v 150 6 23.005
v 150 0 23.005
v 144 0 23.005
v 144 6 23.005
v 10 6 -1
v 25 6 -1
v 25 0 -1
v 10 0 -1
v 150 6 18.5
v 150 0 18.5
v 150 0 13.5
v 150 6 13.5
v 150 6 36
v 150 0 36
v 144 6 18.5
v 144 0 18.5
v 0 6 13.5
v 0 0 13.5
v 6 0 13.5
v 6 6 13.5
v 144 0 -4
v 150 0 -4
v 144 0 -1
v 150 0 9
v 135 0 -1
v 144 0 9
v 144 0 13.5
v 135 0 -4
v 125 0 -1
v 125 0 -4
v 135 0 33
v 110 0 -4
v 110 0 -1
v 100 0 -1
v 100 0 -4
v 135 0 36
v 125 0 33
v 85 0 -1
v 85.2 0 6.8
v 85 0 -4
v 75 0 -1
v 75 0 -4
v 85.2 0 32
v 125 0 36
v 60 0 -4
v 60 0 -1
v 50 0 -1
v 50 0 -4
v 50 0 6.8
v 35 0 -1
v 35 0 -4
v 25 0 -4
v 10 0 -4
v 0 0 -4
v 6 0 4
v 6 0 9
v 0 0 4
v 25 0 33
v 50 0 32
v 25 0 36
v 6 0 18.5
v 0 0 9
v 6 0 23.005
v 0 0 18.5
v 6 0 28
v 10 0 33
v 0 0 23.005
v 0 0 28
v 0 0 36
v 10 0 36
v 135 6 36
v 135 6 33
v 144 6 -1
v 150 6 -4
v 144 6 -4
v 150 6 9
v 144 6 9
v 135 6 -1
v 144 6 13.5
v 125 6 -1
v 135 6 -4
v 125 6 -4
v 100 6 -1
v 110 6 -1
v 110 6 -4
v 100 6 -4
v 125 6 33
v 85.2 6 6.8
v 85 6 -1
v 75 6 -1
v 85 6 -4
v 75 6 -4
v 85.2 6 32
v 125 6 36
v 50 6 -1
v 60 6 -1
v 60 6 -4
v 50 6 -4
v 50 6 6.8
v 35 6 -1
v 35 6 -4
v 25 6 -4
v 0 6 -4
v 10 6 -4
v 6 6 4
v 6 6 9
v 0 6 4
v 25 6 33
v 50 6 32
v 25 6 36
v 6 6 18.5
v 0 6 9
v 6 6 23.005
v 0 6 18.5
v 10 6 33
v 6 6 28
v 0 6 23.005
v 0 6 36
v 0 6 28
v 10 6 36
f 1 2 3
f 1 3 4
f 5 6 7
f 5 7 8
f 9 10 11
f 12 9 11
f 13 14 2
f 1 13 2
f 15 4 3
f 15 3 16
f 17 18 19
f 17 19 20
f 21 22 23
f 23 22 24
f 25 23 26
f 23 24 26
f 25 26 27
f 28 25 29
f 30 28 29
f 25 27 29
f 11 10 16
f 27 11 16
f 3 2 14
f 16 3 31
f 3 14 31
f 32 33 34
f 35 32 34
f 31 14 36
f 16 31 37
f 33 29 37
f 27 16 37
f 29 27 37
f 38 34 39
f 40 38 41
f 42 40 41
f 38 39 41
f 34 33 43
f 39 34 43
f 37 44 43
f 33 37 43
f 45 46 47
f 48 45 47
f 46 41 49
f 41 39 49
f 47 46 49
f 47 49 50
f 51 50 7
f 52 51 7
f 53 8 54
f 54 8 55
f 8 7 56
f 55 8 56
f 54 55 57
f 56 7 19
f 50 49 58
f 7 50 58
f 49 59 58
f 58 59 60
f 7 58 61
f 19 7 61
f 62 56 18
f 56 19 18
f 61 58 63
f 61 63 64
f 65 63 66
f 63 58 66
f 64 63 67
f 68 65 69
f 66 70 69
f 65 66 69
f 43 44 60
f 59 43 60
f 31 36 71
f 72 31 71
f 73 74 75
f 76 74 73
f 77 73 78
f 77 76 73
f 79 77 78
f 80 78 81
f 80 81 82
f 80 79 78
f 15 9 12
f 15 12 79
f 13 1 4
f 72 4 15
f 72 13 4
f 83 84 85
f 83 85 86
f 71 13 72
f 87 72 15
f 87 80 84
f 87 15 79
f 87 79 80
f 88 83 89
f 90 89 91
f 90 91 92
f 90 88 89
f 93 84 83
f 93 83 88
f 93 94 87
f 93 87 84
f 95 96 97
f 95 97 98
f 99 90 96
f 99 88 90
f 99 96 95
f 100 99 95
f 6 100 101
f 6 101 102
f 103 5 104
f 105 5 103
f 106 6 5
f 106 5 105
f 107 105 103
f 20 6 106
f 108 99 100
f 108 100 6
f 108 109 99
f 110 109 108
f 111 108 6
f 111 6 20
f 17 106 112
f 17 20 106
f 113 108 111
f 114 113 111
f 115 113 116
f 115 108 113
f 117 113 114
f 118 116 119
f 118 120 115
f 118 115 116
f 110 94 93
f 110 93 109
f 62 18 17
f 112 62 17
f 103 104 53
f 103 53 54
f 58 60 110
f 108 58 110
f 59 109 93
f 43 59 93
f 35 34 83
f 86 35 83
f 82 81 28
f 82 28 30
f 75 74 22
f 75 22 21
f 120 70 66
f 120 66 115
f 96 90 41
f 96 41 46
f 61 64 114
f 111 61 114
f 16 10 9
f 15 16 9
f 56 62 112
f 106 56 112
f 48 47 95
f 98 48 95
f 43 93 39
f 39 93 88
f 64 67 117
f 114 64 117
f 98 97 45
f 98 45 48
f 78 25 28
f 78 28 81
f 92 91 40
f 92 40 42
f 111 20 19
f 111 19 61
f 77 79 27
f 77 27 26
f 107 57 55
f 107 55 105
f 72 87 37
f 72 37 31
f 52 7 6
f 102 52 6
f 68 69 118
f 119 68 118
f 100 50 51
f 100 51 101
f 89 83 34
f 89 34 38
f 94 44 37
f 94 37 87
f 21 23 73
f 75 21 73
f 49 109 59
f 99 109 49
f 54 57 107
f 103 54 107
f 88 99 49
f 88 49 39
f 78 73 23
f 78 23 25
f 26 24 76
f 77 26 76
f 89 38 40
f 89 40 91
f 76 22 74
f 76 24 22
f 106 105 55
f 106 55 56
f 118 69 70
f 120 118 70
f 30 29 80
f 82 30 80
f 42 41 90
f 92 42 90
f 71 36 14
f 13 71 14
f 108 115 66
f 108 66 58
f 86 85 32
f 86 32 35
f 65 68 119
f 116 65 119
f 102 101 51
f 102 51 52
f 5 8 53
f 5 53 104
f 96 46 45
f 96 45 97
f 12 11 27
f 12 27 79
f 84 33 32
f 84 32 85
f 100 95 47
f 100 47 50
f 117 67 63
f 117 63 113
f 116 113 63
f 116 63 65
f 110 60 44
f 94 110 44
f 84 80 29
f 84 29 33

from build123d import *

# Parameters (mm, degrees)
SKETCH_1_W             = 150
SKETCH_1_H             = 36
EXTRUDE_2_DEPTH        = 6
SKETCH_6_W             = 10
SKETCH_6_H             = 6
EXTRUDE_4_DEPTH        = 4
PATTERN_LINEAR_1_COUNT = 6
PATTERN_LINEAR_1_PITCH = 25
SKETCH_8_W             = 5
SKETCH_8_H             = 6
SKETCH_8_W_2           = 4.995224333
CUT_EXTRUDE_3_DEPTH    = 6
SKETCH_11_W            = 4.504775667
SKETCH_11_H            = 6
SKETCH_11_W_2          = 4.5
CUT_EXTRUDE_4_DEPTH    = 6
SKETCH_12_W            = 35.2
SKETCH_12_H            = 25.2
CUT_EXTRUDE_5_DEPTH    = 155.376163963
SKETCH_14_W            = 15
SKETCH_14_H            = 6
SKETCH_14_W_2          = 10
CUT_EXTRUDE_6_DEPTH    = 4
SKETCH_15_W            = 15
SKETCH_15_H            = 6
EXTRUDE_5_DEPTH        = 1
PATTERN_LINEAR_2_COUNT = 5
PATTERN_LINEAR_2_PITCH = 25
SKETCH_16_W            = 15
SKETCH_16_H            = 6
EXTRUDE_6_DEPTH        = 1
SKETCH_17_W            = 10
SKETCH_17_H            = 6
EXTRUDE_7_DEPTH        = 1
SKETCH_18_W            = 15
SKETCH_18_H            = 6
EXTRUDE_8_DEPTH        = 1
SKETCH_19_W            = 6
SKETCH_19_H            = 6
EXTRUDE_9_DEPTH        = 3


with BuildPart() as part:
    # Эскиз1 → Бобышка-Вытянуть2 (new body)
    with BuildSketch(Plane(origin=(0, 0, 0), x_dir=(1, 0, 0), z_dir=(0, 1, 0))):
        with Locations((75, -18)):
            Rectangle(SKETCH_1_W, SKETCH_1_H)
    extrude(amount=EXTRUDE_2_DEPTH)

    # Эскиз6 → Бобышка-Вытянуть4 (add)
    with BuildSketch(Plane(origin=(0, 0, 0), x_dir=(-1, 0, 0), z_dir=(0, 0, -1))):
        with Locations((-5, 3)):
            Rectangle(SKETCH_6_W, SKETCH_6_H)
    extrude_4 = extrude(amount=EXTRUDE_4_DEPTH)

    # Линейный массив1: Бобышка-Вытянуть4 ×6
    with Locations(*[(i * PATTERN_LINEAR_1_PITCH, 0, 0) for i in range(1, PATTERN_LINEAR_1_COUNT)]):
        add(extrude_4)

    # Эскиз8 → Вырез-Вытянуть3 (cut)
    with BuildSketch(Plane.ZY):
        with Locations((6.5, 3)):
            Rectangle(SKETCH_8_W, SKETCH_8_H)
        with Locations((16, 3)):
            Rectangle(SKETCH_8_W, SKETCH_8_H)
        with Locations((25.502387834, 3)):
            Rectangle(SKETCH_8_W_2, SKETCH_8_H)
    extrude(amount=-CUT_EXTRUDE_3_DEPTH, mode=Mode.SUBTRACT)

    # Эскиз11 → Вырез-Вытянуть4 (cut)
    with BuildSketch(Plane(origin=(150, 0, 0), x_dir=(0, 0, -1), z_dir=(1, 0, 0))):
        with Locations((-20.752387834, 3)):
            Rectangle(SKETCH_11_W, SKETCH_11_H)
        with Locations((-11.25, 3)):
            Rectangle(SKETCH_11_W_2, SKETCH_11_H)
    extrude(amount=-CUT_EXTRUDE_4_DEPTH, mode=Mode.SUBTRACT)

    # Эскиз12 → Вырез-Вытянуть5 (cut, through all)
    with BuildSketch(Plane(origin=(0, 6, 0), x_dir=(1, 0, 0), z_dir=(0, 1, 0))):
        with Locations((67.6, -19.4)):
            Rectangle(SKETCH_12_W, SKETCH_12_H)
    extrude(amount=-CUT_EXTRUDE_5_DEPTH, mode=Mode.SUBTRACT)

    # Эскиз14 → Вырез-Вытянуть6 (cut)
    with BuildSketch(Plane.XY.offset(36)):
        with Locations((17.5, 3)):
            Rectangle(SKETCH_14_W, SKETCH_14_H)
        with Locations((130, 3)):
            Rectangle(SKETCH_14_W_2, SKETCH_14_H)
    extrude(amount=-CUT_EXTRUDE_6_DEPTH, mode=Mode.SUBTRACT)

    # Эскиз15 → Бобышка-Вытянуть5 (add)
    with BuildSketch(Plane(origin=(0, 0, 0), x_dir=(-1, 0, 0), z_dir=(0, 0, -1))):
        with Locations((-17.5, 3)):
            Rectangle(SKETCH_15_W, SKETCH_15_H)
    extrude_5 = extrude(amount=EXTRUDE_5_DEPTH)

    # Линейный массив2: Бобышка-Вытянуть5 ×5
    with Locations(*[(i * PATTERN_LINEAR_2_PITCH, 0, 0) for i in range(1, PATTERN_LINEAR_2_COUNT)]):
        add(extrude_5)

    # Эскиз16 → Бобышка-Вытянуть6 (add)
    with BuildSketch(Plane(origin=(0, 0, 0), x_dir=(-1, 0, 0), z_dir=(0, 0, -1))):
        with Locations((-142.5, 3)):
            Rectangle(SKETCH_16_W, SKETCH_16_H)
    extrude(amount=EXTRUDE_6_DEPTH)

    # Эскиз17 → Бобышка-Вытянуть7 (add)
    with BuildSketch(Plane.XY.offset(32)):
        with Locations((130, 3)):
            Rectangle(SKETCH_17_W, SKETCH_17_H)
    extrude(amount=EXTRUDE_7_DEPTH)

    # Эскиз18 → Бобышка-Вытянуть8 (add)
    with BuildSketch(Plane.XY.offset(32)):
        with Locations((17.5, 3)):
            Rectangle(SKETCH_18_W, SKETCH_18_H)
    extrude(amount=EXTRUDE_8_DEPTH)

    # Эскиз19 → Бобышка-Вытянуть9 (add)
    with BuildSketch(Plane(origin=(0, 0, -1), x_dir=(-1, 0, 0), z_dir=(0, 0, -1))):
        with Locations((-147, 3)):
            Rectangle(SKETCH_19_W, SKETCH_19_H)
    extrude(amount=EXTRUDE_9_DEPTH)


solid = part.part
